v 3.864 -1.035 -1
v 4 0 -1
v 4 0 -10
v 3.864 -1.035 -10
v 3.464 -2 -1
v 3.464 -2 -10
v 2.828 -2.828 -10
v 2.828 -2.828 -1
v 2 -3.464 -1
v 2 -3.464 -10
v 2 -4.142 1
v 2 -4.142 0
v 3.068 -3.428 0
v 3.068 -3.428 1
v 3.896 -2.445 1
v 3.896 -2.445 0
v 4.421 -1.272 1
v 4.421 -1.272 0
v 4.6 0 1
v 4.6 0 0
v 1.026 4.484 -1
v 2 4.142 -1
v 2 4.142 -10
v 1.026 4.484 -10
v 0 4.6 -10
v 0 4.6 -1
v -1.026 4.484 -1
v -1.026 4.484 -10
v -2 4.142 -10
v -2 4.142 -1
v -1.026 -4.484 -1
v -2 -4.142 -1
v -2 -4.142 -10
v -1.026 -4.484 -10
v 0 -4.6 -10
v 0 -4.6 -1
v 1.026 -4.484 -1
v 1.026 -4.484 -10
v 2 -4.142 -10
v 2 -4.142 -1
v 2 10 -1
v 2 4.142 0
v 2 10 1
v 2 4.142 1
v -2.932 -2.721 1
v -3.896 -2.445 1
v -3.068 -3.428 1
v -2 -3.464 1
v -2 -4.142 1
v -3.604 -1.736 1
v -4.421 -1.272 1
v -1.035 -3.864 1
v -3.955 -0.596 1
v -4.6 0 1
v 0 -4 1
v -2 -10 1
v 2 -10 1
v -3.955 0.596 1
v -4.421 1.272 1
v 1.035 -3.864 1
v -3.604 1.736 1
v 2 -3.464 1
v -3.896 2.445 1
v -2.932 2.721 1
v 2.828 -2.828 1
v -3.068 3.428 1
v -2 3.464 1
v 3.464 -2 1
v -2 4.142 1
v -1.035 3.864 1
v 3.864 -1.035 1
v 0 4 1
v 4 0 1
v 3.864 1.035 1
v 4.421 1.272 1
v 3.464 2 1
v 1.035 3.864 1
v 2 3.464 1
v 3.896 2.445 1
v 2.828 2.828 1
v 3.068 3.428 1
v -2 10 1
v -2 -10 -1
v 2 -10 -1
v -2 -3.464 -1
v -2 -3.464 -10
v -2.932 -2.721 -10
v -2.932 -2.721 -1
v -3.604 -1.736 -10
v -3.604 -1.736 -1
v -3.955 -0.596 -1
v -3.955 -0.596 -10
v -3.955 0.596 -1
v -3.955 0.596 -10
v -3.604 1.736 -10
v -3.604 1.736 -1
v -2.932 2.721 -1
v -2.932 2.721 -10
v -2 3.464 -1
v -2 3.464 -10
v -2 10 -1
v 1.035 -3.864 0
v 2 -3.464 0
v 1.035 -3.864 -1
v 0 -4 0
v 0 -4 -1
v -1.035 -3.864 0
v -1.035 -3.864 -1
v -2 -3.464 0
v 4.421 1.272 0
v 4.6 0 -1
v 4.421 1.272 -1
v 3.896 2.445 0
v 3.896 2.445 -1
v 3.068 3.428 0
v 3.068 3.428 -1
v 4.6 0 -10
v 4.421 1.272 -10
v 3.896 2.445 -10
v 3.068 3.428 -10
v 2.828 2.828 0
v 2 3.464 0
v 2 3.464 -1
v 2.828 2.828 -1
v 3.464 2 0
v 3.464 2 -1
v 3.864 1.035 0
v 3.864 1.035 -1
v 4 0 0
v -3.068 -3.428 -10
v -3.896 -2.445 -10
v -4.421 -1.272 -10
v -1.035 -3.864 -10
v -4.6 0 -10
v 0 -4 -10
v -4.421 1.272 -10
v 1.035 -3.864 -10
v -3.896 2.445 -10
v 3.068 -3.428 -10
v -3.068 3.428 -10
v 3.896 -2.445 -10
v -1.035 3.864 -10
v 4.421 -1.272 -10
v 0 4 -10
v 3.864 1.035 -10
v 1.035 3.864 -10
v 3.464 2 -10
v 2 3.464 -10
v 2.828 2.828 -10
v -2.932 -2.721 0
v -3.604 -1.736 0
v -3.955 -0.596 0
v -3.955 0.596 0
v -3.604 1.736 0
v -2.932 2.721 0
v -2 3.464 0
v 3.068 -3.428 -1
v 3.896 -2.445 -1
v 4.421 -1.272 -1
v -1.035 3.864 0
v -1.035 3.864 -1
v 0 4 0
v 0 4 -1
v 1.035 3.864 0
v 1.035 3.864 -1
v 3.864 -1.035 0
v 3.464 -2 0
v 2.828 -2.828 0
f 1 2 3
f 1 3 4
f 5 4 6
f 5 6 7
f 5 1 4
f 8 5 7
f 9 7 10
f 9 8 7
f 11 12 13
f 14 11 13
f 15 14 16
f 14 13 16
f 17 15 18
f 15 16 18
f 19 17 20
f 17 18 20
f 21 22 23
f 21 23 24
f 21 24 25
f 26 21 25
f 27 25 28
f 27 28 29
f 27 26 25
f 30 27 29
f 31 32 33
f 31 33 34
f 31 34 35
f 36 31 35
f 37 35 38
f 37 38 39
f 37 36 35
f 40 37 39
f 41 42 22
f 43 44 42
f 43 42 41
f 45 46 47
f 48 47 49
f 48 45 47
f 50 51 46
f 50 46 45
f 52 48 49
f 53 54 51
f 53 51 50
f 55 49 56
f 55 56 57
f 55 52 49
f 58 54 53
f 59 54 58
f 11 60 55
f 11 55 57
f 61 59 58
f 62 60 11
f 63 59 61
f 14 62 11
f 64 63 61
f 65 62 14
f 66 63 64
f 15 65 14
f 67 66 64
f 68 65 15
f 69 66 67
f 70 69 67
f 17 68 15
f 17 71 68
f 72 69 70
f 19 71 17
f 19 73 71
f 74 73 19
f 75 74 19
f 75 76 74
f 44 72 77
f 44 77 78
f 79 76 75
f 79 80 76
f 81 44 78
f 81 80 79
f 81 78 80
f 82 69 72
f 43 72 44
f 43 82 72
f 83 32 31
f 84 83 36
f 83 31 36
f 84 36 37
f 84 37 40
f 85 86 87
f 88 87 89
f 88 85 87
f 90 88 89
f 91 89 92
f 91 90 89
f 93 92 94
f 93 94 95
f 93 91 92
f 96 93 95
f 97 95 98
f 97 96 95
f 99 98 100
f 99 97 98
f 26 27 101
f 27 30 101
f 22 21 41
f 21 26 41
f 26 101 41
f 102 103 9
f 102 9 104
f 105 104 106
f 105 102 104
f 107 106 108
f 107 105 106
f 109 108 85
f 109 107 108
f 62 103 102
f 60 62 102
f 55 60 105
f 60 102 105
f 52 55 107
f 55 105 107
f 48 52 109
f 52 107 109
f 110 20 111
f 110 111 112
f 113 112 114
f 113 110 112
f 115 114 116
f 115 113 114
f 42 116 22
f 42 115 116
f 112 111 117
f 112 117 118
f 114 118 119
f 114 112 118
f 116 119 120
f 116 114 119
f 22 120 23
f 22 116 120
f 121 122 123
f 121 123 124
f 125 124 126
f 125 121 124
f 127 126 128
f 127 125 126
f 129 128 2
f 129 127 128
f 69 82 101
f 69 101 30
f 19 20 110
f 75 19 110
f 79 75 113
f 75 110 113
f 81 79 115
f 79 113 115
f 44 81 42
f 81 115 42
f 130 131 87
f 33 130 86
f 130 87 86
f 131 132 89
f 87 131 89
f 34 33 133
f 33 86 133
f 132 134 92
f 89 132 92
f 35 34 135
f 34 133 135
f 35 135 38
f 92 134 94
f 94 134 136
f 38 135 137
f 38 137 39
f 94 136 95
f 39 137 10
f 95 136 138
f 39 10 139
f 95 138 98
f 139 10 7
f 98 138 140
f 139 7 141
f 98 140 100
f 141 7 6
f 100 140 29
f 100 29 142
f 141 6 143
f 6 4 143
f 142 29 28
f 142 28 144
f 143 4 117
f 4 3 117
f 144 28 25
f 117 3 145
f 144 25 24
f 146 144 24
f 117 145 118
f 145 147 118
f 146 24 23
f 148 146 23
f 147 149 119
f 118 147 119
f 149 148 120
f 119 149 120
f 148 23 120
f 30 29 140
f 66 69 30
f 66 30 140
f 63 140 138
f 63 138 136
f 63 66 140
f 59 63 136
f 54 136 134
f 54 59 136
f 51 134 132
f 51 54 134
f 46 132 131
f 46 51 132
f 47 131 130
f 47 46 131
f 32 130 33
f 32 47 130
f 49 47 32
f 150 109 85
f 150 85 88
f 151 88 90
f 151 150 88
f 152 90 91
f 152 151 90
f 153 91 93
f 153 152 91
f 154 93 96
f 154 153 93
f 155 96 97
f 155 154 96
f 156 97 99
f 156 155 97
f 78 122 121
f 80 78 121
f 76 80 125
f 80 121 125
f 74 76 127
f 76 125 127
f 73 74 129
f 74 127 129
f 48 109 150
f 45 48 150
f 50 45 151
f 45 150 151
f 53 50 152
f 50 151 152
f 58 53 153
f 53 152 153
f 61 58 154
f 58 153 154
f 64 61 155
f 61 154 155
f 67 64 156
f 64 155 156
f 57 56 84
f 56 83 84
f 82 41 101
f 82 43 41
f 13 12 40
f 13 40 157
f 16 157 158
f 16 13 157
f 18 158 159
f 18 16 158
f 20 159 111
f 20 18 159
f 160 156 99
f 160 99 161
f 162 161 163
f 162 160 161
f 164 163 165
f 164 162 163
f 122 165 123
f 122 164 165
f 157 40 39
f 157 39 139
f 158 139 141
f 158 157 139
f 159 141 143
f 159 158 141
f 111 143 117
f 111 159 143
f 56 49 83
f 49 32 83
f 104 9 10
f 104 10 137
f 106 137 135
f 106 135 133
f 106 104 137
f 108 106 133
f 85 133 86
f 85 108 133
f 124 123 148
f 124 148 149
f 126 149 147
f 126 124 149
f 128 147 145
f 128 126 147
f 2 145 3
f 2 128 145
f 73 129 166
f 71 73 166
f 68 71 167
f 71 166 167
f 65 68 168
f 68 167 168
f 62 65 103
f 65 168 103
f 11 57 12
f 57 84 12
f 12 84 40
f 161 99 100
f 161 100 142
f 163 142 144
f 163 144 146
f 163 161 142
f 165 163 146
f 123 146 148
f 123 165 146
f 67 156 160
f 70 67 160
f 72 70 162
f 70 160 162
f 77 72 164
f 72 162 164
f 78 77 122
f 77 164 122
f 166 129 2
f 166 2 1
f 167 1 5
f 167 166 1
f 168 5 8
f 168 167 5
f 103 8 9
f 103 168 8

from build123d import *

# Parameters (mm, degrees)
F1_DEPTH = 10
F2_DEPTH = 1


# Not quite as in the source:
# - a feature names something its author has since deleted; it is built from what else it names


with BuildPart() as f1:
    # F0 (on Top) → F1 (new body)
    with BuildSketch(Plane.XY):
        with BuildLine():
            Line((-2, 3.4641016151), (-2, 4.1424630354))
            ThreePointArc((-2, 4.1424630354), (-4.6, 0), (-2, -4.1424630354))
            Line((-2, -4.1424630354), (-2, -3.4641016151))
            ThreePointArc((-2, -3.4641016151), (-4, 0), (-2, 3.4641016151))
        make_face()
        with BuildLine():
            ThreePointArc((-2, -4.1424630354), (0, -4.6), (2, -4.1424630354))
            Line((2, -4.1424630354), (2, -3.4641016151))
            ThreePointArc((2, -3.4641016151), (0, -4), (-2, -3.4641016151))
            Line((-2, -3.4641016151), (-2, -4.1424630354))
        make_face()
        with BuildLine():
            ThreePointArc((2, -4.1424630354), (3.8961519478, -2.4454038521), (4.6, 0))
            ThreePointArc((4.6, 0), (3.8961519478, 2.4454038521), (2, 4.1424630354))
            Line((2, 4.1424630354), (2, 3.4641016151))
            ThreePointArc((2, 3.4641016151), (3.4641016151, 2), (4, 0))
            ThreePointArc((4, 0), (3.4641016151, -2), (2, -3.4641016151))
            Line((2, -3.4641016151), (2, -4.1424630354))
        make_face()
        with BuildLine():
            Line((2, 3.4641016151), (2, 4.1424630354))
            ThreePointArc((2, 4.1424630354), (0, 4.6), (-2, 4.1424630354))
            Line((-2, 4.1424630354), (-2, 3.4641016151))
            ThreePointArc((-2, 3.4641016151), (0, 4), (2, 3.4641016151))
        make_face()
    extrude(amount=-F1_DEPTH)

    # F0 (on Top) → F2 (join, symmetric)
    with BuildSketch(Plane.XY):
        with BuildLine():
            ThreePointArc((-2, 4.1424630354), (0, 4.6), (2, 4.1424630354))
            Line((2, 4.1424630354), (2, 10))
            Line((2, 10), (-2, 10))
            Line((-2, 10), (-2, 4.1424630354))
        make_face()
        with BuildLine():
            Line((2, -10), (2, -4.1424630354))
            ThreePointArc((2, -4.1424630354), (0, -4.6), (-2, -4.1424630354))
            Line((-2, -4.1424630354), (-2, -10))
            Line((-2, -10), (2, -10))
        make_face()
        with BuildLine():
            Line((2, 3.4641016151), (2, 4.1424630354))
            ThreePointArc((2, 4.1424630354), (0, 4.6), (-2, 4.1424630354))
            Line((-2, 4.1424630354), (-2, 3.4641016151))
            ThreePointArc((-2, 3.4641016151), (0, 4), (2, 3.4641016151))
        make_face()
        with BuildLine():
            ThreePointArc((-2, -4.1424630354), (0, -4.6), (2, -4.1424630354))
            Line((2, -4.1424630354), (2, -3.4641016151))
            ThreePointArc((2, -3.4641016151), (0, -4), (-2, -3.4641016151))
            Line((-2, -3.4641016151), (-2, -4.1424630354))
        make_face()
        with BuildLine():
            Line((-2, 3.4641016151), (-2, 4.1424630354))
            ThreePointArc((-2, 4.1424630354), (-4.6, 0), (-2, -4.1424630354))
            Line((-2, -4.1424630354), (-2, -3.4641016151))
            ThreePointArc((-2, -3.4641016151), (-4, 0), (-2, 3.4641016151))
        make_face()
        with BuildLine():
            ThreePointArc((2, -4.1424630354), (3.8961519478, -2.4454038521), (4.6, 0))
            ThreePointArc((4.6, 0), (3.8961519478, 2.4454038521), (2, 4.1424630354))
            Line((2, 4.1424630354), (2, 3.4641016151))
            ThreePointArc((2, 3.4641016151), (3.4641016151, 2), (4, 0))
            ThreePointArc((4, 0), (3.4641016151, -2), (2, -3.4641016151))
            Line((2, -3.4641016151), (2, -4.1424630354))
        make_face()
    extrude(amount=F2_DEPTH, both=True)


solid = f1.part
